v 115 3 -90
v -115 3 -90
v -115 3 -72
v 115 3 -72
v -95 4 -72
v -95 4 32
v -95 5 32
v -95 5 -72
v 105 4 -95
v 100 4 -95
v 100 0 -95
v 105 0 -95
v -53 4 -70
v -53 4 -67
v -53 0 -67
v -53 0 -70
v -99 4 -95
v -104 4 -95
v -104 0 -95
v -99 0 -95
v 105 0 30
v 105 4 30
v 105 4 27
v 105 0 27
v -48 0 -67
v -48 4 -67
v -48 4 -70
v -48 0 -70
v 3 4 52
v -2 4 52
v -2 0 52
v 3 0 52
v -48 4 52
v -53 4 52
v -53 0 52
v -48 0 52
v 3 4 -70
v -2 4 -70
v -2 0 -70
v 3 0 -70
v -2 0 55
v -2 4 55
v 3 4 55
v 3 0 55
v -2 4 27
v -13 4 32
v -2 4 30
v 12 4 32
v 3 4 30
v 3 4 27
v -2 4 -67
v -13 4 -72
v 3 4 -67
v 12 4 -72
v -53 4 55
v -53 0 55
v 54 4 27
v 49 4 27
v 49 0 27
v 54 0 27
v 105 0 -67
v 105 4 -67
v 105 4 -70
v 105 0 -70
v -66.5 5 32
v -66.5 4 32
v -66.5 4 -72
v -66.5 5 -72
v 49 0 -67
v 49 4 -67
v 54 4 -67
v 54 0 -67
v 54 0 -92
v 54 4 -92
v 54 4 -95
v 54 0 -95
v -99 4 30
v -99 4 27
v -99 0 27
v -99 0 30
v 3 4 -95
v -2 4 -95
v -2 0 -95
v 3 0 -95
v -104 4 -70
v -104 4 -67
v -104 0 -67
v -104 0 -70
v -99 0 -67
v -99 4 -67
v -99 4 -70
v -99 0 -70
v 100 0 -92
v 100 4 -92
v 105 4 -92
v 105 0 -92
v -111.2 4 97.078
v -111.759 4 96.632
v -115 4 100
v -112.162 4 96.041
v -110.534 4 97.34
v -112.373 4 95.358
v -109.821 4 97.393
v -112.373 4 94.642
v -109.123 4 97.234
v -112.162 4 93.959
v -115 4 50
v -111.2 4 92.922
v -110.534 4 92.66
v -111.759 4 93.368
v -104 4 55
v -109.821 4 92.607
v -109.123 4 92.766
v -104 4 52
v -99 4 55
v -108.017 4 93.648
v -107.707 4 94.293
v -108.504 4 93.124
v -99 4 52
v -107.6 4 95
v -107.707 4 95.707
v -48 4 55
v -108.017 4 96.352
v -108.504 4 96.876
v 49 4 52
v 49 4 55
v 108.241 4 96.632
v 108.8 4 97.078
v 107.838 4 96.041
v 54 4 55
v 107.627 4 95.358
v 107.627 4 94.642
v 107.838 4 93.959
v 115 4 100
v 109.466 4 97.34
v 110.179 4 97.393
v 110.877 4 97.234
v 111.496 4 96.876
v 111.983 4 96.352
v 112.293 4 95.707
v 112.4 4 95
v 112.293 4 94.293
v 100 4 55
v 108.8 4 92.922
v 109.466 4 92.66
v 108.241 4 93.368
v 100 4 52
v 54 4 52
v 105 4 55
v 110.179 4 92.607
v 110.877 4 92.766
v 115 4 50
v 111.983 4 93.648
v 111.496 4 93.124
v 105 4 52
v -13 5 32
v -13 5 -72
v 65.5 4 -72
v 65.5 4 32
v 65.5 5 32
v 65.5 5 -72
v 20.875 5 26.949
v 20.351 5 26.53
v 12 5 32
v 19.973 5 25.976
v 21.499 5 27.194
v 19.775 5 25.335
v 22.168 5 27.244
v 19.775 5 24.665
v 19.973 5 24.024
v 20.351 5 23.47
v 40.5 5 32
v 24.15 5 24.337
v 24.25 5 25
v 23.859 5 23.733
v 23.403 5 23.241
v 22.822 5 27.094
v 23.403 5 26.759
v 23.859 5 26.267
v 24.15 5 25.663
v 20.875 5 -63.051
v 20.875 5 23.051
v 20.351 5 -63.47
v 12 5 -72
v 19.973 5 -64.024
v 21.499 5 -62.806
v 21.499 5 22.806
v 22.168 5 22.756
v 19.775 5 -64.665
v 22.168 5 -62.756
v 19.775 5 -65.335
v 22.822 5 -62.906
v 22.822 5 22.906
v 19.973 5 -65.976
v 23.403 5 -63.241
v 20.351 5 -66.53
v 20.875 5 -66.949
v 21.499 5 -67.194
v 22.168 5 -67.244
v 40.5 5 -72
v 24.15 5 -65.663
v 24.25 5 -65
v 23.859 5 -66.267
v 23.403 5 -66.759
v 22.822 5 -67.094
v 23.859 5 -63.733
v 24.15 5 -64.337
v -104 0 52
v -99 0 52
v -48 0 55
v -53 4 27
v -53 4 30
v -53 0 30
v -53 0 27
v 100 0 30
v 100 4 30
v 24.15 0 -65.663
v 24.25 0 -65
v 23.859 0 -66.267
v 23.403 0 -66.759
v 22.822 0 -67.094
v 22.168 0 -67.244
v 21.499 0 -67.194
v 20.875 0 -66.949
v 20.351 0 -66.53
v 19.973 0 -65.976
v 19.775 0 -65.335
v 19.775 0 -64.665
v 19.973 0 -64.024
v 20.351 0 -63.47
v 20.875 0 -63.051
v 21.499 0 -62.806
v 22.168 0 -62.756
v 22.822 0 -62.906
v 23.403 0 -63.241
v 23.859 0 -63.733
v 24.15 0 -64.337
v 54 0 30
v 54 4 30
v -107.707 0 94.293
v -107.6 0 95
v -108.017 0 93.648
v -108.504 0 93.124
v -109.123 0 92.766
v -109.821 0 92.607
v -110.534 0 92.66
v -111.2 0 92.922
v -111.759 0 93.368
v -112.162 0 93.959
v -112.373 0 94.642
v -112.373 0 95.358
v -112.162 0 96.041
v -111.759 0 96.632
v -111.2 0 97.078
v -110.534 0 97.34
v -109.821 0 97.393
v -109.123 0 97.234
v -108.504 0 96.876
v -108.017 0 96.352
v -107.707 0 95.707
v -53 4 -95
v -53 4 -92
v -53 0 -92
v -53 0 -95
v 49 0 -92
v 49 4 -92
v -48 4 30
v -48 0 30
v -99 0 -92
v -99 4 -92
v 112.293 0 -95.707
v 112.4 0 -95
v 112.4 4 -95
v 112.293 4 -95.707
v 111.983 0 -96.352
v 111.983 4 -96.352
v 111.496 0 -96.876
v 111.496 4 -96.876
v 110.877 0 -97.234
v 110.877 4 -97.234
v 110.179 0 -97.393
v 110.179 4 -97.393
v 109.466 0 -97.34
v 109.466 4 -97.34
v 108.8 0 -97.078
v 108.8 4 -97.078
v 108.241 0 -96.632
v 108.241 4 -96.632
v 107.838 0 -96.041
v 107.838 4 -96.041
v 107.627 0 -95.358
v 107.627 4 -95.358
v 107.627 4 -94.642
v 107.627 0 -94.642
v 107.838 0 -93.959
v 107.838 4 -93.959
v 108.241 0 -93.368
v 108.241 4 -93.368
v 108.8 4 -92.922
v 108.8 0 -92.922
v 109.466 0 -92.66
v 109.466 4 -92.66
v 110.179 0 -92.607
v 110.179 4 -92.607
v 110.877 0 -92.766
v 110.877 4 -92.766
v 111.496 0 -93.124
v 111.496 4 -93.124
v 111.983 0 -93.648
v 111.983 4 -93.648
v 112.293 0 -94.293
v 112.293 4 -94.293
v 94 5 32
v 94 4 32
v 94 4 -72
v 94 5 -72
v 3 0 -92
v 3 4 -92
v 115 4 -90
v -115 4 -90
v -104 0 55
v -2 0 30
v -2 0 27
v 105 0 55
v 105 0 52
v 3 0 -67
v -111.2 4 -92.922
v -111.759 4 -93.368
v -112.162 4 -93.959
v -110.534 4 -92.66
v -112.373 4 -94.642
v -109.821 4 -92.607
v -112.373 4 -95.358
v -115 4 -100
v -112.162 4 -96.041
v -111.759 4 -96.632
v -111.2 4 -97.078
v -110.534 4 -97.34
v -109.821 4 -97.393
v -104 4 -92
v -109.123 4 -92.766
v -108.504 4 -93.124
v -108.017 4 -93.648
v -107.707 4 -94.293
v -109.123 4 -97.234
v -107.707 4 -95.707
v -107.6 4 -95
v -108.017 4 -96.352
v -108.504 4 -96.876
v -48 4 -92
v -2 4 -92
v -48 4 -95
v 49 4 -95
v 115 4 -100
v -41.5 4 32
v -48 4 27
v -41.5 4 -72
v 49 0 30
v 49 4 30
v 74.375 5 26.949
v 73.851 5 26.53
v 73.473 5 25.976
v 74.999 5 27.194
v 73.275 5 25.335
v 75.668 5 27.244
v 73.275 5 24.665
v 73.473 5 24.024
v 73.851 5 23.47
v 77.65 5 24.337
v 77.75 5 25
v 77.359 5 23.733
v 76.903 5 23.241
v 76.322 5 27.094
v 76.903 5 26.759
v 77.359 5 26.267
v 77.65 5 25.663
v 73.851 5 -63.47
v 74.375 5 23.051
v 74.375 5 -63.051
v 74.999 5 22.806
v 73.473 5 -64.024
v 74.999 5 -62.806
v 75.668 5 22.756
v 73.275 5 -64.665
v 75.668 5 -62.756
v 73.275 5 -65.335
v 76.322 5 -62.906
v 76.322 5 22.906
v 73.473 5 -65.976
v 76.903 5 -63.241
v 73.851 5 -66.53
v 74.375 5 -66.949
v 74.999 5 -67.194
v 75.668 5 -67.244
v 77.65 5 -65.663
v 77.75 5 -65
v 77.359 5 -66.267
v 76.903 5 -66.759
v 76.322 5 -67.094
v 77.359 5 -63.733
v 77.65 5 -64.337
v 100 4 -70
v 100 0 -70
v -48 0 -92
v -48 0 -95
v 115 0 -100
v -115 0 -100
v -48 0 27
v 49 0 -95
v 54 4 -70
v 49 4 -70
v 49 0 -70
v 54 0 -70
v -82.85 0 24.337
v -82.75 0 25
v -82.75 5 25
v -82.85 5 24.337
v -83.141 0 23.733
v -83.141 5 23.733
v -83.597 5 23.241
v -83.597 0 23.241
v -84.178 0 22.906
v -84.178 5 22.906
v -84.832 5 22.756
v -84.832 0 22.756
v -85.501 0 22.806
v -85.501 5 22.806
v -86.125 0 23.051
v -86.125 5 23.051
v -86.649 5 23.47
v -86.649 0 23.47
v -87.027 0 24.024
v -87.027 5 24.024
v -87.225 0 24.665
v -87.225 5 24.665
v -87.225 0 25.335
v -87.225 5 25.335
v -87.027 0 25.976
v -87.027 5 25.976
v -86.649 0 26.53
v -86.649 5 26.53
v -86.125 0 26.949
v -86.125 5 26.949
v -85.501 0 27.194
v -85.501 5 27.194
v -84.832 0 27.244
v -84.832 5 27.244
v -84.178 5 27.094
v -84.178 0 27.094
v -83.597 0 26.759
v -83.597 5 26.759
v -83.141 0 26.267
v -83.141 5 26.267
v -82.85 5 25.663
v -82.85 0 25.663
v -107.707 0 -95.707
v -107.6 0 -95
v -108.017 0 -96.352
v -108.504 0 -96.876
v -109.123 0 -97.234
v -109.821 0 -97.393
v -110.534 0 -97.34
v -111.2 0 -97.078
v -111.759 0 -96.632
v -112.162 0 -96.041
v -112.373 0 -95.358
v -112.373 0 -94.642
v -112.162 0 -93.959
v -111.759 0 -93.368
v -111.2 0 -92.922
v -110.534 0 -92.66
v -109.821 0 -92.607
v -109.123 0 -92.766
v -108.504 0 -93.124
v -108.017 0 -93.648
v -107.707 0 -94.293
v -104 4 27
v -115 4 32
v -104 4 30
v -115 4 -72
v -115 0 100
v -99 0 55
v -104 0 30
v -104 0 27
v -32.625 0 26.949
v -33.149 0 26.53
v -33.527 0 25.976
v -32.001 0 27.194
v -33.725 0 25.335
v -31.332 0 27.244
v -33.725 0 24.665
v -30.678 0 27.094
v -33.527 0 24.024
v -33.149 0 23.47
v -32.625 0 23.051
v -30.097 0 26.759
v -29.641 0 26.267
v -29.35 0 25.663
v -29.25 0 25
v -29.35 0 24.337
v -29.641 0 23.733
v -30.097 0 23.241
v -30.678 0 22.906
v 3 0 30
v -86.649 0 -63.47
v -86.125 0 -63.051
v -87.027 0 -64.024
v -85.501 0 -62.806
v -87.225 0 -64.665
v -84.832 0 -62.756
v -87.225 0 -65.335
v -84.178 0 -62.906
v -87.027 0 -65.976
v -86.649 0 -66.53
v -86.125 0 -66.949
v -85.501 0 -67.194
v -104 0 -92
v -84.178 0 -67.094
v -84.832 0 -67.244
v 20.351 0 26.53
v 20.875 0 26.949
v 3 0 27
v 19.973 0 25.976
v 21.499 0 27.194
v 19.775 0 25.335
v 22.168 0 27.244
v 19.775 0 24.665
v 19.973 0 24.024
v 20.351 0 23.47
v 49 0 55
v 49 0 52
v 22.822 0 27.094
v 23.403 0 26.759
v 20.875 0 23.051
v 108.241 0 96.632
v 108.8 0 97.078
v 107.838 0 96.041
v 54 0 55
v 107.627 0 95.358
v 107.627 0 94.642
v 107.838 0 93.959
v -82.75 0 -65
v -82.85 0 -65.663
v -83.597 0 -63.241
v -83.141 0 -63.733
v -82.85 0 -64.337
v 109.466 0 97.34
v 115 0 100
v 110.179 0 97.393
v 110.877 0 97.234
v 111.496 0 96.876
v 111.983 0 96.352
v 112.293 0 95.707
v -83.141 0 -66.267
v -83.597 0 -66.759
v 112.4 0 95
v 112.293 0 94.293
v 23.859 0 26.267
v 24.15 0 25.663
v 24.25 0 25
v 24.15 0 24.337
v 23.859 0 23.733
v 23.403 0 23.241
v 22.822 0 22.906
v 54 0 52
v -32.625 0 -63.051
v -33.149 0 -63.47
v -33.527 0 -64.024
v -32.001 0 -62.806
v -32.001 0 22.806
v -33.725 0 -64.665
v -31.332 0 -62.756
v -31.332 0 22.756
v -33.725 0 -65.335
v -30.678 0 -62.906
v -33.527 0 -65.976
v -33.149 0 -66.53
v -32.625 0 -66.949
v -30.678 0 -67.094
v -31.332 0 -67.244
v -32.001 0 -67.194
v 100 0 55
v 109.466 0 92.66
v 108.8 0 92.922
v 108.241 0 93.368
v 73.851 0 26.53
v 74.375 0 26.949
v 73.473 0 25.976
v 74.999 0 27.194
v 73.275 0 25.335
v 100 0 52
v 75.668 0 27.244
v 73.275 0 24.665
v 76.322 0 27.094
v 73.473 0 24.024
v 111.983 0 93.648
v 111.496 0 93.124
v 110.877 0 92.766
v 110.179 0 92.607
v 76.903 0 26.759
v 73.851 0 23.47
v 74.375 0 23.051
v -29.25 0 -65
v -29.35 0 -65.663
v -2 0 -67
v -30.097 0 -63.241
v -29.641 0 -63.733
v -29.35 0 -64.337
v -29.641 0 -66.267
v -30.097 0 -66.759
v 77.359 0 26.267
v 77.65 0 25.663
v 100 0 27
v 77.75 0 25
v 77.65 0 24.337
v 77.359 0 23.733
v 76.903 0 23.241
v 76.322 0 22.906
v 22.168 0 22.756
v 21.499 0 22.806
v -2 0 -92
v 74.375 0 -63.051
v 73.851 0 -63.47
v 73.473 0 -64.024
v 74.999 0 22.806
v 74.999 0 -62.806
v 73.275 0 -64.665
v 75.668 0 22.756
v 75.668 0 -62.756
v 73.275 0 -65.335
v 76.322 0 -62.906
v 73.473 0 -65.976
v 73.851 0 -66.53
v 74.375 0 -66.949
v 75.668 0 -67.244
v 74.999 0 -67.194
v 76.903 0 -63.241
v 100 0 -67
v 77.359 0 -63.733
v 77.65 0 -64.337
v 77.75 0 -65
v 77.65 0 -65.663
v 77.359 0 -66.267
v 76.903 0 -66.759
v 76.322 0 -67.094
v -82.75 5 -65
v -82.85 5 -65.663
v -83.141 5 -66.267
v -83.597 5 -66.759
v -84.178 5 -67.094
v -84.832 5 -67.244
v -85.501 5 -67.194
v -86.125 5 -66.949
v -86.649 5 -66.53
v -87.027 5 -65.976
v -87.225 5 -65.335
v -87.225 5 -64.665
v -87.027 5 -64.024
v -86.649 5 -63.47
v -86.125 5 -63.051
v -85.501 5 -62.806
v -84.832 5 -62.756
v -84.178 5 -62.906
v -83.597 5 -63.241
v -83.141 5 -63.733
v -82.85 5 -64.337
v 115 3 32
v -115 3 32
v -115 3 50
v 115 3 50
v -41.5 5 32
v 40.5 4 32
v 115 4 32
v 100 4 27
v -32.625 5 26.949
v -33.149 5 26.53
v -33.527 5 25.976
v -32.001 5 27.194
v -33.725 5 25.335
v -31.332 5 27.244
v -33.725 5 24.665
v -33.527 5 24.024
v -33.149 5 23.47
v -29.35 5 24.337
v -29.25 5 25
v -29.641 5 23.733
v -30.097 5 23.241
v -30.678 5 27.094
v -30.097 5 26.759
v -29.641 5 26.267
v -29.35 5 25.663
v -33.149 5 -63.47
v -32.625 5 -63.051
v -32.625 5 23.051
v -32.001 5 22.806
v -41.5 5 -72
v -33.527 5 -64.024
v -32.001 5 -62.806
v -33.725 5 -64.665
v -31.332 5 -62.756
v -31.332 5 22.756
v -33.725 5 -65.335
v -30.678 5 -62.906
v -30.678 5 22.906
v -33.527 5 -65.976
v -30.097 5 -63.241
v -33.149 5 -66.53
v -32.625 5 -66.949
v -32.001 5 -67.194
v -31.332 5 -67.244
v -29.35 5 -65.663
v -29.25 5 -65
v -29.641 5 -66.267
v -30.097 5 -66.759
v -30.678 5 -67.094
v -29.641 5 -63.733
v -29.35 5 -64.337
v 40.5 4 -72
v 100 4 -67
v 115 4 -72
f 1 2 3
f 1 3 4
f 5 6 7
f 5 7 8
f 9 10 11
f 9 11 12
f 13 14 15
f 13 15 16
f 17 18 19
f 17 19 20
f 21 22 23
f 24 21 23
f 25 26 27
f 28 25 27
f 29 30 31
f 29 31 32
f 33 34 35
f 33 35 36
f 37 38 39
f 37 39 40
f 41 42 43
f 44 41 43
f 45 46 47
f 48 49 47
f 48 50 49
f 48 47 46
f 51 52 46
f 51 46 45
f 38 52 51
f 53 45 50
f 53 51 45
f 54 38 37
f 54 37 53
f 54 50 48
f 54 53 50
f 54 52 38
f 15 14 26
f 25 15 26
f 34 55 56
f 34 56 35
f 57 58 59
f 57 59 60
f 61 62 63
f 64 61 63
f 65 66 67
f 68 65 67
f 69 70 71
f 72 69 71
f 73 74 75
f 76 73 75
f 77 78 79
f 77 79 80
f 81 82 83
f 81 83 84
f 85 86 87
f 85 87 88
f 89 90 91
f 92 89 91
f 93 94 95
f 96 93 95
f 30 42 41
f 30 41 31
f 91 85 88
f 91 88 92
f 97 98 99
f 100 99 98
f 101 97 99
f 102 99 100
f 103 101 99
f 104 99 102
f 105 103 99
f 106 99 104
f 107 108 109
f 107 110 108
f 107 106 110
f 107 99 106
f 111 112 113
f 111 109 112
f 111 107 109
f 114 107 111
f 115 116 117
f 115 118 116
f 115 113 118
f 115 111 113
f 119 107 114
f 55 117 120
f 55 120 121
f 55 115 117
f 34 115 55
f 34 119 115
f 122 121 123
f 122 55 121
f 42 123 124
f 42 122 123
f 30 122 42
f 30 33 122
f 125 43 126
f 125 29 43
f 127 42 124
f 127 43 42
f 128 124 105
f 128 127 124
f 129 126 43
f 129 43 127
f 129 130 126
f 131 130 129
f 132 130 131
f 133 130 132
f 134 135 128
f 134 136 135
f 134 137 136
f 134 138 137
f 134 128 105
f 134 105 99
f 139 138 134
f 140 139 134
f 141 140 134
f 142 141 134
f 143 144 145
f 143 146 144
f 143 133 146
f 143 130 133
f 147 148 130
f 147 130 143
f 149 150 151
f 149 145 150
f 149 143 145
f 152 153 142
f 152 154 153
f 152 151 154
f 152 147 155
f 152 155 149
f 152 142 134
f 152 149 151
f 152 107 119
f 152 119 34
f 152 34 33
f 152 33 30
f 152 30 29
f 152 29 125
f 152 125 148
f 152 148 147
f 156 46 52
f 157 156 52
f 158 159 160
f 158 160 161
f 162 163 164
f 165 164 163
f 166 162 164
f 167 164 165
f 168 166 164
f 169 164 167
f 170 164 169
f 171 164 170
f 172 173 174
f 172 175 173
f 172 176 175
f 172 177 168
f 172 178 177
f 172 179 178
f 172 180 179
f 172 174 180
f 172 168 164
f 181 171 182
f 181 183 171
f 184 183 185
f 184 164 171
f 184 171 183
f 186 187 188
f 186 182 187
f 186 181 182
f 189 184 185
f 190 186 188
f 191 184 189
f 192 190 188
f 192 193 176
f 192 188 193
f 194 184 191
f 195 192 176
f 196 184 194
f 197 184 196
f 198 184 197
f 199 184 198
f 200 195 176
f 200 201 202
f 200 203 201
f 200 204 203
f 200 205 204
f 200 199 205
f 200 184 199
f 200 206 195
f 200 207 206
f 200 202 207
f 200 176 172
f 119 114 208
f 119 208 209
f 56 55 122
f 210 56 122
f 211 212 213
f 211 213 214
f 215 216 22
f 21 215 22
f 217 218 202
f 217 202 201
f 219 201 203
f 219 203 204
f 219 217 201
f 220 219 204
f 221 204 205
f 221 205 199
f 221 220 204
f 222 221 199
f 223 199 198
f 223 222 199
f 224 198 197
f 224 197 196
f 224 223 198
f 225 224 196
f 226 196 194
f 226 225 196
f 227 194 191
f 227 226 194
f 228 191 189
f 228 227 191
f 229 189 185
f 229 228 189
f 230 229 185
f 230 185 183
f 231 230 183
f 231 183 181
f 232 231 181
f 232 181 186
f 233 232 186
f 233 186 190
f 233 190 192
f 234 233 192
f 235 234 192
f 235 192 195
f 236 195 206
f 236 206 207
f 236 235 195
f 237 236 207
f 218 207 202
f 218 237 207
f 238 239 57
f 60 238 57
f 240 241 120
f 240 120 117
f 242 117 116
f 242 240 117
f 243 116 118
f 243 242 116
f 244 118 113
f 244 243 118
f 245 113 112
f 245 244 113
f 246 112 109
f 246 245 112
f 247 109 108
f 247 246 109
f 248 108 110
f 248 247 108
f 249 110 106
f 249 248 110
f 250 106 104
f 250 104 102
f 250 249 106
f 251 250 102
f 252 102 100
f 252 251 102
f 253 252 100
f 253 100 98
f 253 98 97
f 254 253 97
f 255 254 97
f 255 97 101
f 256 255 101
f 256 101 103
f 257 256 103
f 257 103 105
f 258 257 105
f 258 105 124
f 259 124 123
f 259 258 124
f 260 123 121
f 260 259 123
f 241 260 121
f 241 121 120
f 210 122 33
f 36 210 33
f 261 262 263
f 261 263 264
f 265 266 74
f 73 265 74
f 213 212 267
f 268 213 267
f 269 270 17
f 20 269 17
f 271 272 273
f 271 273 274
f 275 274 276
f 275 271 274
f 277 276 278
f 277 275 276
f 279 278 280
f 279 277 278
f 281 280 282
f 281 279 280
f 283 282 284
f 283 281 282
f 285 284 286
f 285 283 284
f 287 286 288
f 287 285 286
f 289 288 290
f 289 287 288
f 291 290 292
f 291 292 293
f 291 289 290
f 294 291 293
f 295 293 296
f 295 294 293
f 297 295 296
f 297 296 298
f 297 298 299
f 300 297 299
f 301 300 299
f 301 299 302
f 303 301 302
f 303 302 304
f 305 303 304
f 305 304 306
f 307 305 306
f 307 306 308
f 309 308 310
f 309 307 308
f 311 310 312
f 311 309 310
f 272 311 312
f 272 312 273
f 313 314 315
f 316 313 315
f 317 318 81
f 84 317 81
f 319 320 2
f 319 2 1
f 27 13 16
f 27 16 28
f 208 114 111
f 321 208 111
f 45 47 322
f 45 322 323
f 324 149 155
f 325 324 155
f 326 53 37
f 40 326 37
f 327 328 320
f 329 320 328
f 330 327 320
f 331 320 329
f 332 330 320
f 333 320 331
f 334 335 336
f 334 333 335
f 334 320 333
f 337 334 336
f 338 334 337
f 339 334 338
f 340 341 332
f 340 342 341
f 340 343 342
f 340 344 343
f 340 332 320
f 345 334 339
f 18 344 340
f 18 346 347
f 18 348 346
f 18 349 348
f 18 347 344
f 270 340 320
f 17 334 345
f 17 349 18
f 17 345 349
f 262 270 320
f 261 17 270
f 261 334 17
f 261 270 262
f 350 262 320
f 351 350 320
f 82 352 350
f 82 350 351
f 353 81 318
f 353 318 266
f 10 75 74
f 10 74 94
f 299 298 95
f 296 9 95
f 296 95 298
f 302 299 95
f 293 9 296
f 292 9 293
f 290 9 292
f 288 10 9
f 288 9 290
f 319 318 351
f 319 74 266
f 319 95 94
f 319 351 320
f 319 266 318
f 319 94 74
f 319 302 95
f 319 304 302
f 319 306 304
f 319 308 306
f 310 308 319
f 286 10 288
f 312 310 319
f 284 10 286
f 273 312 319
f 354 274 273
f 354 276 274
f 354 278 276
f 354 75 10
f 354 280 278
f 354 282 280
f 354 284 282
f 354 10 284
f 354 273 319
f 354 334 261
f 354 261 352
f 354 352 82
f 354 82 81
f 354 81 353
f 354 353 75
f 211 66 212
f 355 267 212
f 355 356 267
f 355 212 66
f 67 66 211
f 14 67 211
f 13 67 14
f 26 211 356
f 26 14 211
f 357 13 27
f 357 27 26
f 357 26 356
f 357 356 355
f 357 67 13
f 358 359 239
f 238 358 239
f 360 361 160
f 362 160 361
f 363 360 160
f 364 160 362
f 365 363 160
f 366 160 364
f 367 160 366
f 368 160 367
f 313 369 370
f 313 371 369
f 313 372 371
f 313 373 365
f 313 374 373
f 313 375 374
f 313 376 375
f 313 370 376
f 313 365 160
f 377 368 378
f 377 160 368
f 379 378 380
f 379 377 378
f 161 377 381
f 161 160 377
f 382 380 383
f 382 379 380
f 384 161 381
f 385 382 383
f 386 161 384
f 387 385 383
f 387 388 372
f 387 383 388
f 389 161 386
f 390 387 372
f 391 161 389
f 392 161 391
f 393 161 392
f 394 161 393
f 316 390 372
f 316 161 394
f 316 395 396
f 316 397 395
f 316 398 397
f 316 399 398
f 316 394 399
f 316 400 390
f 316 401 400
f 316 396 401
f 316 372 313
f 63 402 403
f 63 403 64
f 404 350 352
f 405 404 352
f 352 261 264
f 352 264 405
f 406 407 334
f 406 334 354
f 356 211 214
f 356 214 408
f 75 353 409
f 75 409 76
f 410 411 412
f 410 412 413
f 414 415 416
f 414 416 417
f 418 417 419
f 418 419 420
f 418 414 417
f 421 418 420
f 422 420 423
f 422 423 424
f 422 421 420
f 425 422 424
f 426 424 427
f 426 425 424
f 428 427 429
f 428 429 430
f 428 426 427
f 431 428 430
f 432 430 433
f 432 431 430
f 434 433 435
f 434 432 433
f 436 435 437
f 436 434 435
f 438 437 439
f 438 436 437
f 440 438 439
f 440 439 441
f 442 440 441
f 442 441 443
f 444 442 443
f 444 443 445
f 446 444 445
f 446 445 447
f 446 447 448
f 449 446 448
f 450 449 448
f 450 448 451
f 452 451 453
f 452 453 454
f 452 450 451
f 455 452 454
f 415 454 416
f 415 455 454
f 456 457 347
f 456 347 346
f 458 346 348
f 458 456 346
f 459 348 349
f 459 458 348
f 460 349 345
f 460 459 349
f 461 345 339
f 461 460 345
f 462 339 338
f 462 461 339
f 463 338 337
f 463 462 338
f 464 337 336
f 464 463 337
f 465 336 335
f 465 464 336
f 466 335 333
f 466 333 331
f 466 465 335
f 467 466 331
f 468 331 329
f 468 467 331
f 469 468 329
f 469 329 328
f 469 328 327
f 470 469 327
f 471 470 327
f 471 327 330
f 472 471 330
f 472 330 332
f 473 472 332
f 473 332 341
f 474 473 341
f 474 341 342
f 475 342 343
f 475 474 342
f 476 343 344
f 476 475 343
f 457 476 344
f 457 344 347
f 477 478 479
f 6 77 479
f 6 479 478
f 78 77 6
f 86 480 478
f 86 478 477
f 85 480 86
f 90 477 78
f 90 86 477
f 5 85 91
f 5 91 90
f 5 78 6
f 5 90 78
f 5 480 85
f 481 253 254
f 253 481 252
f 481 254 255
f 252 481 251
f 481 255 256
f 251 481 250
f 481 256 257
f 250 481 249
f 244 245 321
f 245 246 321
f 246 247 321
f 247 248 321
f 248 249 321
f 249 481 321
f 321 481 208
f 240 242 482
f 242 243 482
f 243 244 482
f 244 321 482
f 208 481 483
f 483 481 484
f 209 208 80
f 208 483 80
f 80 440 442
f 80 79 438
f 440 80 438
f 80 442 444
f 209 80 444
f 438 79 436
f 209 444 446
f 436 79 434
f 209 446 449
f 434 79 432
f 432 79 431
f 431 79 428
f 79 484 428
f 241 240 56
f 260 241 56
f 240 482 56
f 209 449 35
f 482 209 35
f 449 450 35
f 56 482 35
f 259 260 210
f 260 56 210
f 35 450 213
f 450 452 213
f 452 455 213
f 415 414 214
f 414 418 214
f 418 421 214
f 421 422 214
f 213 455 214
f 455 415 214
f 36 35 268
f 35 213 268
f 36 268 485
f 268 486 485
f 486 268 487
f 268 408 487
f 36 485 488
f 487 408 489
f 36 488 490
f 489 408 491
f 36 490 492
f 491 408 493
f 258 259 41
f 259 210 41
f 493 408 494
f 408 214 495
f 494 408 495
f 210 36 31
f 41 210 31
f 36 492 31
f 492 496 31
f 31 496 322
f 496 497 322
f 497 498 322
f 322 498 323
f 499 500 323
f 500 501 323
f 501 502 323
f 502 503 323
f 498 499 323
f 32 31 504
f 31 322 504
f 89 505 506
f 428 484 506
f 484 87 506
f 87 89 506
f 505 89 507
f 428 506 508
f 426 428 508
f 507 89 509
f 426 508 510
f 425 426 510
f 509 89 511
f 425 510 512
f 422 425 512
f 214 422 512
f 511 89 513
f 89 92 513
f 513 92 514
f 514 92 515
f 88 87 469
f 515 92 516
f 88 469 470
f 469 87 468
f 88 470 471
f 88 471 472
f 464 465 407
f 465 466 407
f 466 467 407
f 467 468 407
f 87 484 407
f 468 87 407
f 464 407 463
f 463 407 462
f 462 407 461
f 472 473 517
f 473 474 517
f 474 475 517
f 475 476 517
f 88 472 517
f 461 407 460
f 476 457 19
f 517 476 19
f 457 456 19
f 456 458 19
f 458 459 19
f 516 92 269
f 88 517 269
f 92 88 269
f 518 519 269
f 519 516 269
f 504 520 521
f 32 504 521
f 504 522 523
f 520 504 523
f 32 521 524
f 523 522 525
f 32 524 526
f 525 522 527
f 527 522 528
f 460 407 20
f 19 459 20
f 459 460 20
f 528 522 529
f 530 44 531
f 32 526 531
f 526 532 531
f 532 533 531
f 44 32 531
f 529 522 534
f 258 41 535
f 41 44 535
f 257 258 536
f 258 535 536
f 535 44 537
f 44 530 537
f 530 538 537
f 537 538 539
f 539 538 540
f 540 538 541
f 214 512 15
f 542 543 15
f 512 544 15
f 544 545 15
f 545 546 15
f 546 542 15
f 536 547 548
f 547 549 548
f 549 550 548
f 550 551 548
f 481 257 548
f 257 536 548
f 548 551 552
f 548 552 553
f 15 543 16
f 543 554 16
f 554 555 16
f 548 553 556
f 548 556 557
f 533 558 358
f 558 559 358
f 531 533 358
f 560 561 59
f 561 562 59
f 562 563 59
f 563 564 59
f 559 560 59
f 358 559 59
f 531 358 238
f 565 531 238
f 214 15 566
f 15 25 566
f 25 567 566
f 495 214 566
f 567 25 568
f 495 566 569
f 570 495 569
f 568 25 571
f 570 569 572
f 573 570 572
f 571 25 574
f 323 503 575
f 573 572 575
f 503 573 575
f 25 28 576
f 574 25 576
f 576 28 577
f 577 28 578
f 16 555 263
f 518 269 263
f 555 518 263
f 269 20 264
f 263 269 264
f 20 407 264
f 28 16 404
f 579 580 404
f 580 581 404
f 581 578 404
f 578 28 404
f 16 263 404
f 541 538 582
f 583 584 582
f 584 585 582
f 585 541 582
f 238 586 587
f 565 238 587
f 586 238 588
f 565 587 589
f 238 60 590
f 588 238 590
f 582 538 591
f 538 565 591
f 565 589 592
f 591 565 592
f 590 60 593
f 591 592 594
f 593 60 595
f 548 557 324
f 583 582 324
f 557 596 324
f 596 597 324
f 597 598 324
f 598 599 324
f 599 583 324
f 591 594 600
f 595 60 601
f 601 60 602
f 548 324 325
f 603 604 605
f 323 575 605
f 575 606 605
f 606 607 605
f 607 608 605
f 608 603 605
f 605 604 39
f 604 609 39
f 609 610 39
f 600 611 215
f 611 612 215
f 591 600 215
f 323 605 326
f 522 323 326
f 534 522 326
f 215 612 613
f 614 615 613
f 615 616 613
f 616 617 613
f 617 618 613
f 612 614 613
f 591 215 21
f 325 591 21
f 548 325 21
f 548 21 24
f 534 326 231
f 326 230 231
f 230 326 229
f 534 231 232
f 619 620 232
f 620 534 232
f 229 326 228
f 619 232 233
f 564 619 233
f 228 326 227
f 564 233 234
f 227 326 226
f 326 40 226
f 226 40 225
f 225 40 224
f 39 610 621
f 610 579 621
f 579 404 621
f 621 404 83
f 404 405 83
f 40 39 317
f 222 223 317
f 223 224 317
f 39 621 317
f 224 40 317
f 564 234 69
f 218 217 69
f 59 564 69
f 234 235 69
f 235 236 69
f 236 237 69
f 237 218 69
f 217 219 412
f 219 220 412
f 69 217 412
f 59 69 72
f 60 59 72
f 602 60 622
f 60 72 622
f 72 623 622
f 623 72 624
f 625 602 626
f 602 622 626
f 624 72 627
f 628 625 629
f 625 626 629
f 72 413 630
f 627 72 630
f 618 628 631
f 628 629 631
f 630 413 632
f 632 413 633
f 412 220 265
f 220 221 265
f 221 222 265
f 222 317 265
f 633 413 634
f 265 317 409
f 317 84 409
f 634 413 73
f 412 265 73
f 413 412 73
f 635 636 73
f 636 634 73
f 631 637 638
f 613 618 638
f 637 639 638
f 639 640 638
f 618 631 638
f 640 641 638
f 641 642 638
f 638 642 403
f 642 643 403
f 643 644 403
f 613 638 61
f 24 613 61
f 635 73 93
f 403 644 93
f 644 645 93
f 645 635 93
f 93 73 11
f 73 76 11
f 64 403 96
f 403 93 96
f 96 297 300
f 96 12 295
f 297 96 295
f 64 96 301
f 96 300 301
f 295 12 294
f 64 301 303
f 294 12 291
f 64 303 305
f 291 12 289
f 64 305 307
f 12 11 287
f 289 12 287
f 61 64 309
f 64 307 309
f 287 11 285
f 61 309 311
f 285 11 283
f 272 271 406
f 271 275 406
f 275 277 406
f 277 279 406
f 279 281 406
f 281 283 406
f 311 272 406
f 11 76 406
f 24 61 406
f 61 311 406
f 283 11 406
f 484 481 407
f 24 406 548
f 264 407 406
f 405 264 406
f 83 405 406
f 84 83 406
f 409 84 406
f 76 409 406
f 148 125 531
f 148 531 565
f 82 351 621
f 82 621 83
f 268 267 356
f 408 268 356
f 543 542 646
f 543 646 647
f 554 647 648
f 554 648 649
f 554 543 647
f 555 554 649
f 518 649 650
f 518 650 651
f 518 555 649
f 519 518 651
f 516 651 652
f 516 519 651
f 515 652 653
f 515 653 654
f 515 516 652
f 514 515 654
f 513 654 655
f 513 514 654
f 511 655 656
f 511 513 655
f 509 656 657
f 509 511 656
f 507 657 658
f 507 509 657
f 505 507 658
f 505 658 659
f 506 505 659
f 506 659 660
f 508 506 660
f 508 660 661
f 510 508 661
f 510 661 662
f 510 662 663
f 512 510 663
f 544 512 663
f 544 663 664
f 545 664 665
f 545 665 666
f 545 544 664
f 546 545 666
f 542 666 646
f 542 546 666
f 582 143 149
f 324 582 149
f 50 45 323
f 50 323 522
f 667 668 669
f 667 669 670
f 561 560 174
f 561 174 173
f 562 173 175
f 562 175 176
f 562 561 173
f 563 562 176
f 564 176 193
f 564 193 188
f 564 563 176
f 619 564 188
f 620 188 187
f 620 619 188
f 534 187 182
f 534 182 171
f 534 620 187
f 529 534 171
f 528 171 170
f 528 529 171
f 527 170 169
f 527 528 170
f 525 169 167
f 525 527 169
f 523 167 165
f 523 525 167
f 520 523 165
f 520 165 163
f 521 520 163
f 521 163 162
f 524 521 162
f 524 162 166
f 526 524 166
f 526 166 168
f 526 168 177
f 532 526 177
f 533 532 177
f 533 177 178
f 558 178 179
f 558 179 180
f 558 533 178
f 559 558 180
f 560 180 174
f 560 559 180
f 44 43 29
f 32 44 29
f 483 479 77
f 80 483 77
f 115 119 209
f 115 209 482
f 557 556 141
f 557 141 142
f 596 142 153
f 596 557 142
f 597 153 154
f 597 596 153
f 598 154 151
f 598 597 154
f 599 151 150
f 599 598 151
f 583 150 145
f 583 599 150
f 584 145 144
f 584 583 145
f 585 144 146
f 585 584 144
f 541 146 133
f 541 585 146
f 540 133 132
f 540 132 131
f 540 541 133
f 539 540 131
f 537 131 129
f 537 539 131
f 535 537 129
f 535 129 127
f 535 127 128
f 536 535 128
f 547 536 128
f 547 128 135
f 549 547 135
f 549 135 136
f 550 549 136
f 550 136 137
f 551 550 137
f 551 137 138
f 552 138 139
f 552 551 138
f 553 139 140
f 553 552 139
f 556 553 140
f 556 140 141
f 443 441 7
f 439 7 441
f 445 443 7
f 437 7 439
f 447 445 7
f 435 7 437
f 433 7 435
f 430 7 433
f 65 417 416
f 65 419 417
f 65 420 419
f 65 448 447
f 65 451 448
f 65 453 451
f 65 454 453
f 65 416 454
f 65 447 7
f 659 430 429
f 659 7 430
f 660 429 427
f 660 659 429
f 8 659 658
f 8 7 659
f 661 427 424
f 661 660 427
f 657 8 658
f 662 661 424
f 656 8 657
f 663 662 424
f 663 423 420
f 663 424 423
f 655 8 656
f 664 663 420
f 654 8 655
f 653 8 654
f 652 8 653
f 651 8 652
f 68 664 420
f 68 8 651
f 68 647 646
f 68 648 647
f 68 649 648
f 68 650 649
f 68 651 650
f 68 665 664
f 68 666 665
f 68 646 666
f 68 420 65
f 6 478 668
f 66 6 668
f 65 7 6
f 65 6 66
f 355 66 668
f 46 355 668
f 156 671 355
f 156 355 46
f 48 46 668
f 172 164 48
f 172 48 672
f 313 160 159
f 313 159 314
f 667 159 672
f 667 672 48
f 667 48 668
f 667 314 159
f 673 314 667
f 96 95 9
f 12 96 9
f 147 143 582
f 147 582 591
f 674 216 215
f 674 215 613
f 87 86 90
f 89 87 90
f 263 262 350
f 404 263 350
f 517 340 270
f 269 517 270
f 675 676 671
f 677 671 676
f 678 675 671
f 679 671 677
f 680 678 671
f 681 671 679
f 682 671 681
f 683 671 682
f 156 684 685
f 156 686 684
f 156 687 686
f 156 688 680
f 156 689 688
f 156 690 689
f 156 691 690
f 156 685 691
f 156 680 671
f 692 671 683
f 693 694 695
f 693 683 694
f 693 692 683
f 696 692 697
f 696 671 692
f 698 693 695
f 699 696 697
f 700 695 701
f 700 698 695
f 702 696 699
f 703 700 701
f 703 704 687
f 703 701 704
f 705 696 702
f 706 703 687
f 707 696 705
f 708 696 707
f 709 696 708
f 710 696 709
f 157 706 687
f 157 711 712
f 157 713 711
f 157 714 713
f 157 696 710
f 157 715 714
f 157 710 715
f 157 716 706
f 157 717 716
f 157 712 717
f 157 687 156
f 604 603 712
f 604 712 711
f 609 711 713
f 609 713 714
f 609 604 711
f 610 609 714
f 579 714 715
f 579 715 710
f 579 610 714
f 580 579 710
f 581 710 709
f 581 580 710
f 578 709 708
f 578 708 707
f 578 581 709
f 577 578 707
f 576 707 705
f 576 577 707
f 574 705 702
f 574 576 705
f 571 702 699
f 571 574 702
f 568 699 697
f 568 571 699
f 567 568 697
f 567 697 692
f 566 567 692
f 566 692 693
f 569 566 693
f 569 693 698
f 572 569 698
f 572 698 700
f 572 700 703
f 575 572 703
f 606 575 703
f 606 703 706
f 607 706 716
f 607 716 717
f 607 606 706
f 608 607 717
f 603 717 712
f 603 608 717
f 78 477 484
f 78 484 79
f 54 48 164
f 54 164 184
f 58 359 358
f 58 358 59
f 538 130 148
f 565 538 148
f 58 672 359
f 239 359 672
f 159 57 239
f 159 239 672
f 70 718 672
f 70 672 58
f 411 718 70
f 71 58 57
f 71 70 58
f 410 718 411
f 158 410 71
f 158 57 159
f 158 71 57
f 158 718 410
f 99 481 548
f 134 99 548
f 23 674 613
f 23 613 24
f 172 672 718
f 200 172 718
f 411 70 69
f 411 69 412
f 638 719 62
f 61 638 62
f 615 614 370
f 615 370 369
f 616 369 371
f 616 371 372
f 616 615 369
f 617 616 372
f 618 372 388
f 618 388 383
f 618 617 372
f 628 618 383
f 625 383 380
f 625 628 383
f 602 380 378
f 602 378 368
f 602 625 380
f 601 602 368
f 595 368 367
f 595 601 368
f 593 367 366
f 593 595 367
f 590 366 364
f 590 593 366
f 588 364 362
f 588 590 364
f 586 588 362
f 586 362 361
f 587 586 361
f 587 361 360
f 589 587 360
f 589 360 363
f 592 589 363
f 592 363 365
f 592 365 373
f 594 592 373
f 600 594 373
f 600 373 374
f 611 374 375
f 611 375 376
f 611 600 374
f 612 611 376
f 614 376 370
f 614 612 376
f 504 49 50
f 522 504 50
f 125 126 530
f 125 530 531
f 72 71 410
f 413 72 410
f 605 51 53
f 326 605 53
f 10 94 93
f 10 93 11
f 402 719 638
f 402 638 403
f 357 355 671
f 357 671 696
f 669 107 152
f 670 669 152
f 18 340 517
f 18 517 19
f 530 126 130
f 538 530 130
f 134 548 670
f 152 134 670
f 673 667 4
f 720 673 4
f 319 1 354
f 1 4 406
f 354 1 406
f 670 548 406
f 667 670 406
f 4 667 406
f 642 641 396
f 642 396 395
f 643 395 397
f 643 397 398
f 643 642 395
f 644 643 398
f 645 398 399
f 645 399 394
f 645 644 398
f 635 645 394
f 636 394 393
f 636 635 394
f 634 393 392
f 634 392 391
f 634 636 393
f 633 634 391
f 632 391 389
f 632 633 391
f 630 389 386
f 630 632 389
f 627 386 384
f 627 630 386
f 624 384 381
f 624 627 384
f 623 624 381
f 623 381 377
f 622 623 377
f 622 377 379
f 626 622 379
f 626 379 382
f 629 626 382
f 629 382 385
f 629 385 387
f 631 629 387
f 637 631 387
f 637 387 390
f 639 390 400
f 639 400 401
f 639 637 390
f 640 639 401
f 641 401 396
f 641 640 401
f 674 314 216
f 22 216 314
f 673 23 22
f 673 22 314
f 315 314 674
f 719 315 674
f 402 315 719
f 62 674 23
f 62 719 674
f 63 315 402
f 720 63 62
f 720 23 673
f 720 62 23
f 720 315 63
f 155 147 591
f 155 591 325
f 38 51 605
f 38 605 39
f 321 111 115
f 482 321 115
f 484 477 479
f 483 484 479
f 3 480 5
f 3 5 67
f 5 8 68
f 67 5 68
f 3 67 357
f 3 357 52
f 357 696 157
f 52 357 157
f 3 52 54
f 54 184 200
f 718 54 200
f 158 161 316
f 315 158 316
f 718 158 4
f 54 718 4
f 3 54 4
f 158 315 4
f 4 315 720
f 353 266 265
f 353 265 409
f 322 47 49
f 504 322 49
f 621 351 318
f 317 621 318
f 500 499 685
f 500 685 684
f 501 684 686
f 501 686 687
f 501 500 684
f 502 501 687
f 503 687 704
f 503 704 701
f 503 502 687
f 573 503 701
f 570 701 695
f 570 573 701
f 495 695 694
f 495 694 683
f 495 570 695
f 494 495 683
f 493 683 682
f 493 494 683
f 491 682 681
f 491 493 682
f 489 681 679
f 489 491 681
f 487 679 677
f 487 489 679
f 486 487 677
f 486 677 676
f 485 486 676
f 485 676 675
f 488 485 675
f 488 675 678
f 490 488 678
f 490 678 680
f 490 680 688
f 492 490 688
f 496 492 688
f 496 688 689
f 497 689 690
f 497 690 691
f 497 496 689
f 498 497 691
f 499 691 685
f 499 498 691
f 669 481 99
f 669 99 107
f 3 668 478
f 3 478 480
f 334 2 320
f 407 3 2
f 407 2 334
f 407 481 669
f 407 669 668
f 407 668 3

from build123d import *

# Parameters (mm, degrees)
BODY_SKETCH_W                          = 230
BODY_SKETCH_H                          = 200
BODY_DEPTH                             = 4
MOUNTING_HOLES_OUTLINE_R               = 2.4
MOUNTING_HOLES_DEPTH                   = 4
SKETCH4_W                              = 230
SKETCH4_H                              = 18
CABLE_CUTOUTS_DEPTH                    = 1
SKETCH6_W                              = 28.5
SKETCH6_H                              = 104
DRIVER_EXTRUSION_DEPTH                 = 1
DRIVER_MOUNTING_HOLES_OUTLINE_R        = 2.25
DRIVER_MOUNTING_HOLES_DEPTH            = 5
DRIVER_PATTERN_COUNT                   = 4
DRIVER_PATTERN_PITCH                   = 53.5
SKETCH9_W                              = 5
SKETCH9_H                              = 3
CABLE_FIXIATOR_CUTOUT_DEPTH            = 153.449991801
CABLE_FIXIATOR_PATTERN_COUNT           = 5
CABLE_FIXIATOR_PATTERN_PITCH           = 51
CABLE_FIXIATOR_PATTERN_COPY_1_SKETCH_W = 5
CABLE_FIXIATOR_PATTERN_COPY_1_SKETCH_H = 3
CABLE_FIXIATOR_PATTERN_COPY_1_DEPTH    = 153.449991801
CABLE_FIXIATOR_PATTERN_COPY_2_SKETCH_W = 5
CABLE_FIXIATOR_PATTERN_COPY_2_SKETCH_H = 3
CABLE_FIXIATOR_PATTERN_COPY_2_DEPTH    = 153.449991801
CABLE_FIXIATOR_PATTERN_COPY_3_SKETCH_W = 5
CABLE_FIXIATOR_PATTERN_COPY_3_SKETCH_H = 3
CABLE_FIXIATOR_PATTERN_COPY_3_DEPTH    = 153.449991801
CABLE_FIXIATOR_PATTERN_COPY_4_SKETCH_W = 5
CABLE_FIXIATOR_PATTERN_COPY_4_SKETCH_H = 3
CABLE_FIXIATOR_PATTERN_COPY_4_DEPTH    = 153.449991801


# Read off the part's stored shape, not the designer's step: mounting_holes, driver_mounting_holes
with BuildPart() as part:
    # body_sketch → body (new body)
    with BuildSketch(Plane(origin=(0, 0, 0), x_dir=(1, 0, 0), z_dir=(0, 1, 0))):
        Rectangle(BODY_SKETCH_W, BODY_SKETCH_H)
    extrude(amount=BODY_DEPTH)

    # mounting_holes outline → mounting_holes (cut)
    with BuildSketch(Plane(origin=(0, 0, 0), x_dir=(1, 0, 0), z_dir=(0, 1, 0))):
        with Locations((110, -95)):
            Circle(MOUNTING_HOLES_OUTLINE_R)
        with Locations((-110, 95)):
            Circle(MOUNTING_HOLES_OUTLINE_R)
        with Locations((-110, -95)):
            Circle(MOUNTING_HOLES_OUTLINE_R)
        with Locations((110, 95)):
            Circle(MOUNTING_HOLES_OUTLINE_R)
    extrude(amount=MOUNTING_HOLES_DEPTH, mode=Mode.SUBTRACT)

    # Sketch4 → cable_cutouts (cut)
    with BuildSketch(Plane(origin=(0, 4, 0), x_dir=(1, 0, 0), z_dir=(0, 1, 0))):
        with Locations((0, 81)):
            Rectangle(SKETCH4_W, SKETCH4_H)
        with Locations((0, -41)):
            Rectangle(SKETCH4_W, SKETCH4_H)
    extrude(amount=-CABLE_CUTOUTS_DEPTH, mode=Mode.SUBTRACT)

    # Sketch6 → driver_extrusion (add)
    with BuildSketch(Plane(origin=(0, 4, 0), x_dir=(1, 0, 0), z_dir=(0, 1, 0))):
        with Locations((-80.75, 20)):
            Rectangle(SKETCH6_W, SKETCH6_H)
    driver_extrusion = extrude(amount=DRIVER_EXTRUSION_DEPTH)

    # driver_mounting_holes outline → driver_mounting_holes (cut)
    with BuildSketch(Plane(origin=(0, 0, 0), x_dir=(1, 0, 0), z_dir=(0, 1, 0))):
        with Locations((-85, -25)):
            Circle(DRIVER_MOUNTING_HOLES_OUTLINE_R)
        with Locations((-85, 65)):
            Circle(DRIVER_MOUNTING_HOLES_OUTLINE_R)
    driver_mounting_holes = extrude(amount=DRIVER_MOUNTING_HOLES_DEPTH, mode=Mode.SUBTRACT)

    # driver_pattern: driver_extrusion, driver_mounting_holes ×4
    with Locations(*[(i * DRIVER_PATTERN_PITCH, 0, 0) for i in range(1, DRIVER_PATTERN_COUNT)]):
        add(driver_extrusion)
        add(driver_mounting_holes, mode=Mode.SUBTRACT)

    # Sketch9 → cable_fixiator_cutout (cut, through all)
    with BuildSketch(Plane(origin=(0, 4, 0), x_dir=(1, 0, 0), z_dir=(0, 1, 0))):
        with Locations((-101.5, 93.5)):
            Rectangle(SKETCH9_W, SKETCH9_H)
        with Locations((-101.5, 68.5)):
            Rectangle(SKETCH9_W, SKETCH9_H)
    cable_fixiator_cutout = extrude(amount=-CABLE_FIXIATOR_CUTOUT_DEPTH, mode=Mode.SUBTRACT)

    # cable_fixiator_mirror: cable_fixiator_cutout across plane
    add(cable_fixiator_cutout.mirror(Plane.XY.offset(-20)), mode=Mode.SUBTRACT)

    # cable_fixiator_pattern: cable_fixiator_cutout ×5
    with Locations(*[(i * CABLE_FIXIATOR_PATTERN_PITCH, 0, 0) for i in range(1, CABLE_FIXIATOR_PATTERN_COUNT)]):
        add(cable_fixiator_cutout, mode=Mode.SUBTRACT)

    # cable_fixiator_pattern copy 1 sketch → cable_fixiator_pattern copy 1 (cut, through all)
    with BuildSketch(Plane(origin=(51, 4, -40), x_dir=(1, 0, 0), z_dir=(0, 1, 0))):
        with Locations((-101.5, -93.5)):
            Rectangle(CABLE_FIXIATOR_PATTERN_COPY_1_SKETCH_W, CABLE_FIXIATOR_PATTERN_COPY_1_SKETCH_H)
        with Locations((-101.5, -68.5)):
            Rectangle(CABLE_FIXIATOR_PATTERN_COPY_1_SKETCH_W, CABLE_FIXIATOR_PATTERN_COPY_1_SKETCH_H)
    extrude(amount=-CABLE_FIXIATOR_PATTERN_COPY_1_DEPTH, mode=Mode.SUBTRACT)

    # cable_fixiator_pattern copy 2 sketch → cable_fixiator_pattern copy 2 (cut, through all)
    with BuildSketch(Plane(origin=(102, 4, -40), x_dir=(1, 0, 0), z_dir=(0, 1, 0))):
        with Locations((-101.5, -93.5)):
            Rectangle(CABLE_FIXIATOR_PATTERN_COPY_2_SKETCH_W, CABLE_FIXIATOR_PATTERN_COPY_2_SKETCH_H)
        with Locations((-101.5, -68.5)):
            Rectangle(CABLE_FIXIATOR_PATTERN_COPY_2_SKETCH_W, CABLE_FIXIATOR_PATTERN_COPY_2_SKETCH_H)
    extrude(amount=-CABLE_FIXIATOR_PATTERN_COPY_2_DEPTH, mode=Mode.SUBTRACT)

    # cable_fixiator_pattern copy 3 sketch → cable_fixiator_pattern copy 3 (cut, through all)
    with BuildSketch(Plane(origin=(153, 4, -40), x_dir=(1, 0, 0), z_dir=(0, 1, 0))):
        with Locations((-101.5, -93.5)):
            Rectangle(CABLE_FIXIATOR_PATTERN_COPY_3_SKETCH_W, CABLE_FIXIATOR_PATTERN_COPY_3_SKETCH_H)
        with Locations((-101.5, -68.5)):
            Rectangle(CABLE_FIXIATOR_PATTERN_COPY_3_SKETCH_W, CABLE_FIXIATOR_PATTERN_COPY_3_SKETCH_H)
    extrude(amount=-CABLE_FIXIATOR_PATTERN_COPY_3_DEPTH, mode=Mode.SUBTRACT)

    # cable_fixiator_pattern copy 4 sketch → cable_fixiator_pattern copy 4 (cut, through all)
    with BuildSketch(Plane(origin=(204, 4, -40), x_dir=(1, 0, 0), z_dir=(0, 1, 0))):
        with Locations((-101.5, -93.5)):
            Rectangle(CABLE_FIXIATOR_PATTERN_COPY_4_SKETCH_W, CABLE_FIXIATOR_PATTERN_COPY_4_SKETCH_H)
        with Locations((-101.5, -68.5)):
            Rectangle(CABLE_FIXIATOR_PATTERN_COPY_4_SKETCH_W, CABLE_FIXIATOR_PATTERN_COPY_4_SKETCH_H)
    extrude(amount=-CABLE_FIXIATOR_PATTERN_COPY_4_DEPTH, mode=Mode.SUBTRACT)


solid = part.part
